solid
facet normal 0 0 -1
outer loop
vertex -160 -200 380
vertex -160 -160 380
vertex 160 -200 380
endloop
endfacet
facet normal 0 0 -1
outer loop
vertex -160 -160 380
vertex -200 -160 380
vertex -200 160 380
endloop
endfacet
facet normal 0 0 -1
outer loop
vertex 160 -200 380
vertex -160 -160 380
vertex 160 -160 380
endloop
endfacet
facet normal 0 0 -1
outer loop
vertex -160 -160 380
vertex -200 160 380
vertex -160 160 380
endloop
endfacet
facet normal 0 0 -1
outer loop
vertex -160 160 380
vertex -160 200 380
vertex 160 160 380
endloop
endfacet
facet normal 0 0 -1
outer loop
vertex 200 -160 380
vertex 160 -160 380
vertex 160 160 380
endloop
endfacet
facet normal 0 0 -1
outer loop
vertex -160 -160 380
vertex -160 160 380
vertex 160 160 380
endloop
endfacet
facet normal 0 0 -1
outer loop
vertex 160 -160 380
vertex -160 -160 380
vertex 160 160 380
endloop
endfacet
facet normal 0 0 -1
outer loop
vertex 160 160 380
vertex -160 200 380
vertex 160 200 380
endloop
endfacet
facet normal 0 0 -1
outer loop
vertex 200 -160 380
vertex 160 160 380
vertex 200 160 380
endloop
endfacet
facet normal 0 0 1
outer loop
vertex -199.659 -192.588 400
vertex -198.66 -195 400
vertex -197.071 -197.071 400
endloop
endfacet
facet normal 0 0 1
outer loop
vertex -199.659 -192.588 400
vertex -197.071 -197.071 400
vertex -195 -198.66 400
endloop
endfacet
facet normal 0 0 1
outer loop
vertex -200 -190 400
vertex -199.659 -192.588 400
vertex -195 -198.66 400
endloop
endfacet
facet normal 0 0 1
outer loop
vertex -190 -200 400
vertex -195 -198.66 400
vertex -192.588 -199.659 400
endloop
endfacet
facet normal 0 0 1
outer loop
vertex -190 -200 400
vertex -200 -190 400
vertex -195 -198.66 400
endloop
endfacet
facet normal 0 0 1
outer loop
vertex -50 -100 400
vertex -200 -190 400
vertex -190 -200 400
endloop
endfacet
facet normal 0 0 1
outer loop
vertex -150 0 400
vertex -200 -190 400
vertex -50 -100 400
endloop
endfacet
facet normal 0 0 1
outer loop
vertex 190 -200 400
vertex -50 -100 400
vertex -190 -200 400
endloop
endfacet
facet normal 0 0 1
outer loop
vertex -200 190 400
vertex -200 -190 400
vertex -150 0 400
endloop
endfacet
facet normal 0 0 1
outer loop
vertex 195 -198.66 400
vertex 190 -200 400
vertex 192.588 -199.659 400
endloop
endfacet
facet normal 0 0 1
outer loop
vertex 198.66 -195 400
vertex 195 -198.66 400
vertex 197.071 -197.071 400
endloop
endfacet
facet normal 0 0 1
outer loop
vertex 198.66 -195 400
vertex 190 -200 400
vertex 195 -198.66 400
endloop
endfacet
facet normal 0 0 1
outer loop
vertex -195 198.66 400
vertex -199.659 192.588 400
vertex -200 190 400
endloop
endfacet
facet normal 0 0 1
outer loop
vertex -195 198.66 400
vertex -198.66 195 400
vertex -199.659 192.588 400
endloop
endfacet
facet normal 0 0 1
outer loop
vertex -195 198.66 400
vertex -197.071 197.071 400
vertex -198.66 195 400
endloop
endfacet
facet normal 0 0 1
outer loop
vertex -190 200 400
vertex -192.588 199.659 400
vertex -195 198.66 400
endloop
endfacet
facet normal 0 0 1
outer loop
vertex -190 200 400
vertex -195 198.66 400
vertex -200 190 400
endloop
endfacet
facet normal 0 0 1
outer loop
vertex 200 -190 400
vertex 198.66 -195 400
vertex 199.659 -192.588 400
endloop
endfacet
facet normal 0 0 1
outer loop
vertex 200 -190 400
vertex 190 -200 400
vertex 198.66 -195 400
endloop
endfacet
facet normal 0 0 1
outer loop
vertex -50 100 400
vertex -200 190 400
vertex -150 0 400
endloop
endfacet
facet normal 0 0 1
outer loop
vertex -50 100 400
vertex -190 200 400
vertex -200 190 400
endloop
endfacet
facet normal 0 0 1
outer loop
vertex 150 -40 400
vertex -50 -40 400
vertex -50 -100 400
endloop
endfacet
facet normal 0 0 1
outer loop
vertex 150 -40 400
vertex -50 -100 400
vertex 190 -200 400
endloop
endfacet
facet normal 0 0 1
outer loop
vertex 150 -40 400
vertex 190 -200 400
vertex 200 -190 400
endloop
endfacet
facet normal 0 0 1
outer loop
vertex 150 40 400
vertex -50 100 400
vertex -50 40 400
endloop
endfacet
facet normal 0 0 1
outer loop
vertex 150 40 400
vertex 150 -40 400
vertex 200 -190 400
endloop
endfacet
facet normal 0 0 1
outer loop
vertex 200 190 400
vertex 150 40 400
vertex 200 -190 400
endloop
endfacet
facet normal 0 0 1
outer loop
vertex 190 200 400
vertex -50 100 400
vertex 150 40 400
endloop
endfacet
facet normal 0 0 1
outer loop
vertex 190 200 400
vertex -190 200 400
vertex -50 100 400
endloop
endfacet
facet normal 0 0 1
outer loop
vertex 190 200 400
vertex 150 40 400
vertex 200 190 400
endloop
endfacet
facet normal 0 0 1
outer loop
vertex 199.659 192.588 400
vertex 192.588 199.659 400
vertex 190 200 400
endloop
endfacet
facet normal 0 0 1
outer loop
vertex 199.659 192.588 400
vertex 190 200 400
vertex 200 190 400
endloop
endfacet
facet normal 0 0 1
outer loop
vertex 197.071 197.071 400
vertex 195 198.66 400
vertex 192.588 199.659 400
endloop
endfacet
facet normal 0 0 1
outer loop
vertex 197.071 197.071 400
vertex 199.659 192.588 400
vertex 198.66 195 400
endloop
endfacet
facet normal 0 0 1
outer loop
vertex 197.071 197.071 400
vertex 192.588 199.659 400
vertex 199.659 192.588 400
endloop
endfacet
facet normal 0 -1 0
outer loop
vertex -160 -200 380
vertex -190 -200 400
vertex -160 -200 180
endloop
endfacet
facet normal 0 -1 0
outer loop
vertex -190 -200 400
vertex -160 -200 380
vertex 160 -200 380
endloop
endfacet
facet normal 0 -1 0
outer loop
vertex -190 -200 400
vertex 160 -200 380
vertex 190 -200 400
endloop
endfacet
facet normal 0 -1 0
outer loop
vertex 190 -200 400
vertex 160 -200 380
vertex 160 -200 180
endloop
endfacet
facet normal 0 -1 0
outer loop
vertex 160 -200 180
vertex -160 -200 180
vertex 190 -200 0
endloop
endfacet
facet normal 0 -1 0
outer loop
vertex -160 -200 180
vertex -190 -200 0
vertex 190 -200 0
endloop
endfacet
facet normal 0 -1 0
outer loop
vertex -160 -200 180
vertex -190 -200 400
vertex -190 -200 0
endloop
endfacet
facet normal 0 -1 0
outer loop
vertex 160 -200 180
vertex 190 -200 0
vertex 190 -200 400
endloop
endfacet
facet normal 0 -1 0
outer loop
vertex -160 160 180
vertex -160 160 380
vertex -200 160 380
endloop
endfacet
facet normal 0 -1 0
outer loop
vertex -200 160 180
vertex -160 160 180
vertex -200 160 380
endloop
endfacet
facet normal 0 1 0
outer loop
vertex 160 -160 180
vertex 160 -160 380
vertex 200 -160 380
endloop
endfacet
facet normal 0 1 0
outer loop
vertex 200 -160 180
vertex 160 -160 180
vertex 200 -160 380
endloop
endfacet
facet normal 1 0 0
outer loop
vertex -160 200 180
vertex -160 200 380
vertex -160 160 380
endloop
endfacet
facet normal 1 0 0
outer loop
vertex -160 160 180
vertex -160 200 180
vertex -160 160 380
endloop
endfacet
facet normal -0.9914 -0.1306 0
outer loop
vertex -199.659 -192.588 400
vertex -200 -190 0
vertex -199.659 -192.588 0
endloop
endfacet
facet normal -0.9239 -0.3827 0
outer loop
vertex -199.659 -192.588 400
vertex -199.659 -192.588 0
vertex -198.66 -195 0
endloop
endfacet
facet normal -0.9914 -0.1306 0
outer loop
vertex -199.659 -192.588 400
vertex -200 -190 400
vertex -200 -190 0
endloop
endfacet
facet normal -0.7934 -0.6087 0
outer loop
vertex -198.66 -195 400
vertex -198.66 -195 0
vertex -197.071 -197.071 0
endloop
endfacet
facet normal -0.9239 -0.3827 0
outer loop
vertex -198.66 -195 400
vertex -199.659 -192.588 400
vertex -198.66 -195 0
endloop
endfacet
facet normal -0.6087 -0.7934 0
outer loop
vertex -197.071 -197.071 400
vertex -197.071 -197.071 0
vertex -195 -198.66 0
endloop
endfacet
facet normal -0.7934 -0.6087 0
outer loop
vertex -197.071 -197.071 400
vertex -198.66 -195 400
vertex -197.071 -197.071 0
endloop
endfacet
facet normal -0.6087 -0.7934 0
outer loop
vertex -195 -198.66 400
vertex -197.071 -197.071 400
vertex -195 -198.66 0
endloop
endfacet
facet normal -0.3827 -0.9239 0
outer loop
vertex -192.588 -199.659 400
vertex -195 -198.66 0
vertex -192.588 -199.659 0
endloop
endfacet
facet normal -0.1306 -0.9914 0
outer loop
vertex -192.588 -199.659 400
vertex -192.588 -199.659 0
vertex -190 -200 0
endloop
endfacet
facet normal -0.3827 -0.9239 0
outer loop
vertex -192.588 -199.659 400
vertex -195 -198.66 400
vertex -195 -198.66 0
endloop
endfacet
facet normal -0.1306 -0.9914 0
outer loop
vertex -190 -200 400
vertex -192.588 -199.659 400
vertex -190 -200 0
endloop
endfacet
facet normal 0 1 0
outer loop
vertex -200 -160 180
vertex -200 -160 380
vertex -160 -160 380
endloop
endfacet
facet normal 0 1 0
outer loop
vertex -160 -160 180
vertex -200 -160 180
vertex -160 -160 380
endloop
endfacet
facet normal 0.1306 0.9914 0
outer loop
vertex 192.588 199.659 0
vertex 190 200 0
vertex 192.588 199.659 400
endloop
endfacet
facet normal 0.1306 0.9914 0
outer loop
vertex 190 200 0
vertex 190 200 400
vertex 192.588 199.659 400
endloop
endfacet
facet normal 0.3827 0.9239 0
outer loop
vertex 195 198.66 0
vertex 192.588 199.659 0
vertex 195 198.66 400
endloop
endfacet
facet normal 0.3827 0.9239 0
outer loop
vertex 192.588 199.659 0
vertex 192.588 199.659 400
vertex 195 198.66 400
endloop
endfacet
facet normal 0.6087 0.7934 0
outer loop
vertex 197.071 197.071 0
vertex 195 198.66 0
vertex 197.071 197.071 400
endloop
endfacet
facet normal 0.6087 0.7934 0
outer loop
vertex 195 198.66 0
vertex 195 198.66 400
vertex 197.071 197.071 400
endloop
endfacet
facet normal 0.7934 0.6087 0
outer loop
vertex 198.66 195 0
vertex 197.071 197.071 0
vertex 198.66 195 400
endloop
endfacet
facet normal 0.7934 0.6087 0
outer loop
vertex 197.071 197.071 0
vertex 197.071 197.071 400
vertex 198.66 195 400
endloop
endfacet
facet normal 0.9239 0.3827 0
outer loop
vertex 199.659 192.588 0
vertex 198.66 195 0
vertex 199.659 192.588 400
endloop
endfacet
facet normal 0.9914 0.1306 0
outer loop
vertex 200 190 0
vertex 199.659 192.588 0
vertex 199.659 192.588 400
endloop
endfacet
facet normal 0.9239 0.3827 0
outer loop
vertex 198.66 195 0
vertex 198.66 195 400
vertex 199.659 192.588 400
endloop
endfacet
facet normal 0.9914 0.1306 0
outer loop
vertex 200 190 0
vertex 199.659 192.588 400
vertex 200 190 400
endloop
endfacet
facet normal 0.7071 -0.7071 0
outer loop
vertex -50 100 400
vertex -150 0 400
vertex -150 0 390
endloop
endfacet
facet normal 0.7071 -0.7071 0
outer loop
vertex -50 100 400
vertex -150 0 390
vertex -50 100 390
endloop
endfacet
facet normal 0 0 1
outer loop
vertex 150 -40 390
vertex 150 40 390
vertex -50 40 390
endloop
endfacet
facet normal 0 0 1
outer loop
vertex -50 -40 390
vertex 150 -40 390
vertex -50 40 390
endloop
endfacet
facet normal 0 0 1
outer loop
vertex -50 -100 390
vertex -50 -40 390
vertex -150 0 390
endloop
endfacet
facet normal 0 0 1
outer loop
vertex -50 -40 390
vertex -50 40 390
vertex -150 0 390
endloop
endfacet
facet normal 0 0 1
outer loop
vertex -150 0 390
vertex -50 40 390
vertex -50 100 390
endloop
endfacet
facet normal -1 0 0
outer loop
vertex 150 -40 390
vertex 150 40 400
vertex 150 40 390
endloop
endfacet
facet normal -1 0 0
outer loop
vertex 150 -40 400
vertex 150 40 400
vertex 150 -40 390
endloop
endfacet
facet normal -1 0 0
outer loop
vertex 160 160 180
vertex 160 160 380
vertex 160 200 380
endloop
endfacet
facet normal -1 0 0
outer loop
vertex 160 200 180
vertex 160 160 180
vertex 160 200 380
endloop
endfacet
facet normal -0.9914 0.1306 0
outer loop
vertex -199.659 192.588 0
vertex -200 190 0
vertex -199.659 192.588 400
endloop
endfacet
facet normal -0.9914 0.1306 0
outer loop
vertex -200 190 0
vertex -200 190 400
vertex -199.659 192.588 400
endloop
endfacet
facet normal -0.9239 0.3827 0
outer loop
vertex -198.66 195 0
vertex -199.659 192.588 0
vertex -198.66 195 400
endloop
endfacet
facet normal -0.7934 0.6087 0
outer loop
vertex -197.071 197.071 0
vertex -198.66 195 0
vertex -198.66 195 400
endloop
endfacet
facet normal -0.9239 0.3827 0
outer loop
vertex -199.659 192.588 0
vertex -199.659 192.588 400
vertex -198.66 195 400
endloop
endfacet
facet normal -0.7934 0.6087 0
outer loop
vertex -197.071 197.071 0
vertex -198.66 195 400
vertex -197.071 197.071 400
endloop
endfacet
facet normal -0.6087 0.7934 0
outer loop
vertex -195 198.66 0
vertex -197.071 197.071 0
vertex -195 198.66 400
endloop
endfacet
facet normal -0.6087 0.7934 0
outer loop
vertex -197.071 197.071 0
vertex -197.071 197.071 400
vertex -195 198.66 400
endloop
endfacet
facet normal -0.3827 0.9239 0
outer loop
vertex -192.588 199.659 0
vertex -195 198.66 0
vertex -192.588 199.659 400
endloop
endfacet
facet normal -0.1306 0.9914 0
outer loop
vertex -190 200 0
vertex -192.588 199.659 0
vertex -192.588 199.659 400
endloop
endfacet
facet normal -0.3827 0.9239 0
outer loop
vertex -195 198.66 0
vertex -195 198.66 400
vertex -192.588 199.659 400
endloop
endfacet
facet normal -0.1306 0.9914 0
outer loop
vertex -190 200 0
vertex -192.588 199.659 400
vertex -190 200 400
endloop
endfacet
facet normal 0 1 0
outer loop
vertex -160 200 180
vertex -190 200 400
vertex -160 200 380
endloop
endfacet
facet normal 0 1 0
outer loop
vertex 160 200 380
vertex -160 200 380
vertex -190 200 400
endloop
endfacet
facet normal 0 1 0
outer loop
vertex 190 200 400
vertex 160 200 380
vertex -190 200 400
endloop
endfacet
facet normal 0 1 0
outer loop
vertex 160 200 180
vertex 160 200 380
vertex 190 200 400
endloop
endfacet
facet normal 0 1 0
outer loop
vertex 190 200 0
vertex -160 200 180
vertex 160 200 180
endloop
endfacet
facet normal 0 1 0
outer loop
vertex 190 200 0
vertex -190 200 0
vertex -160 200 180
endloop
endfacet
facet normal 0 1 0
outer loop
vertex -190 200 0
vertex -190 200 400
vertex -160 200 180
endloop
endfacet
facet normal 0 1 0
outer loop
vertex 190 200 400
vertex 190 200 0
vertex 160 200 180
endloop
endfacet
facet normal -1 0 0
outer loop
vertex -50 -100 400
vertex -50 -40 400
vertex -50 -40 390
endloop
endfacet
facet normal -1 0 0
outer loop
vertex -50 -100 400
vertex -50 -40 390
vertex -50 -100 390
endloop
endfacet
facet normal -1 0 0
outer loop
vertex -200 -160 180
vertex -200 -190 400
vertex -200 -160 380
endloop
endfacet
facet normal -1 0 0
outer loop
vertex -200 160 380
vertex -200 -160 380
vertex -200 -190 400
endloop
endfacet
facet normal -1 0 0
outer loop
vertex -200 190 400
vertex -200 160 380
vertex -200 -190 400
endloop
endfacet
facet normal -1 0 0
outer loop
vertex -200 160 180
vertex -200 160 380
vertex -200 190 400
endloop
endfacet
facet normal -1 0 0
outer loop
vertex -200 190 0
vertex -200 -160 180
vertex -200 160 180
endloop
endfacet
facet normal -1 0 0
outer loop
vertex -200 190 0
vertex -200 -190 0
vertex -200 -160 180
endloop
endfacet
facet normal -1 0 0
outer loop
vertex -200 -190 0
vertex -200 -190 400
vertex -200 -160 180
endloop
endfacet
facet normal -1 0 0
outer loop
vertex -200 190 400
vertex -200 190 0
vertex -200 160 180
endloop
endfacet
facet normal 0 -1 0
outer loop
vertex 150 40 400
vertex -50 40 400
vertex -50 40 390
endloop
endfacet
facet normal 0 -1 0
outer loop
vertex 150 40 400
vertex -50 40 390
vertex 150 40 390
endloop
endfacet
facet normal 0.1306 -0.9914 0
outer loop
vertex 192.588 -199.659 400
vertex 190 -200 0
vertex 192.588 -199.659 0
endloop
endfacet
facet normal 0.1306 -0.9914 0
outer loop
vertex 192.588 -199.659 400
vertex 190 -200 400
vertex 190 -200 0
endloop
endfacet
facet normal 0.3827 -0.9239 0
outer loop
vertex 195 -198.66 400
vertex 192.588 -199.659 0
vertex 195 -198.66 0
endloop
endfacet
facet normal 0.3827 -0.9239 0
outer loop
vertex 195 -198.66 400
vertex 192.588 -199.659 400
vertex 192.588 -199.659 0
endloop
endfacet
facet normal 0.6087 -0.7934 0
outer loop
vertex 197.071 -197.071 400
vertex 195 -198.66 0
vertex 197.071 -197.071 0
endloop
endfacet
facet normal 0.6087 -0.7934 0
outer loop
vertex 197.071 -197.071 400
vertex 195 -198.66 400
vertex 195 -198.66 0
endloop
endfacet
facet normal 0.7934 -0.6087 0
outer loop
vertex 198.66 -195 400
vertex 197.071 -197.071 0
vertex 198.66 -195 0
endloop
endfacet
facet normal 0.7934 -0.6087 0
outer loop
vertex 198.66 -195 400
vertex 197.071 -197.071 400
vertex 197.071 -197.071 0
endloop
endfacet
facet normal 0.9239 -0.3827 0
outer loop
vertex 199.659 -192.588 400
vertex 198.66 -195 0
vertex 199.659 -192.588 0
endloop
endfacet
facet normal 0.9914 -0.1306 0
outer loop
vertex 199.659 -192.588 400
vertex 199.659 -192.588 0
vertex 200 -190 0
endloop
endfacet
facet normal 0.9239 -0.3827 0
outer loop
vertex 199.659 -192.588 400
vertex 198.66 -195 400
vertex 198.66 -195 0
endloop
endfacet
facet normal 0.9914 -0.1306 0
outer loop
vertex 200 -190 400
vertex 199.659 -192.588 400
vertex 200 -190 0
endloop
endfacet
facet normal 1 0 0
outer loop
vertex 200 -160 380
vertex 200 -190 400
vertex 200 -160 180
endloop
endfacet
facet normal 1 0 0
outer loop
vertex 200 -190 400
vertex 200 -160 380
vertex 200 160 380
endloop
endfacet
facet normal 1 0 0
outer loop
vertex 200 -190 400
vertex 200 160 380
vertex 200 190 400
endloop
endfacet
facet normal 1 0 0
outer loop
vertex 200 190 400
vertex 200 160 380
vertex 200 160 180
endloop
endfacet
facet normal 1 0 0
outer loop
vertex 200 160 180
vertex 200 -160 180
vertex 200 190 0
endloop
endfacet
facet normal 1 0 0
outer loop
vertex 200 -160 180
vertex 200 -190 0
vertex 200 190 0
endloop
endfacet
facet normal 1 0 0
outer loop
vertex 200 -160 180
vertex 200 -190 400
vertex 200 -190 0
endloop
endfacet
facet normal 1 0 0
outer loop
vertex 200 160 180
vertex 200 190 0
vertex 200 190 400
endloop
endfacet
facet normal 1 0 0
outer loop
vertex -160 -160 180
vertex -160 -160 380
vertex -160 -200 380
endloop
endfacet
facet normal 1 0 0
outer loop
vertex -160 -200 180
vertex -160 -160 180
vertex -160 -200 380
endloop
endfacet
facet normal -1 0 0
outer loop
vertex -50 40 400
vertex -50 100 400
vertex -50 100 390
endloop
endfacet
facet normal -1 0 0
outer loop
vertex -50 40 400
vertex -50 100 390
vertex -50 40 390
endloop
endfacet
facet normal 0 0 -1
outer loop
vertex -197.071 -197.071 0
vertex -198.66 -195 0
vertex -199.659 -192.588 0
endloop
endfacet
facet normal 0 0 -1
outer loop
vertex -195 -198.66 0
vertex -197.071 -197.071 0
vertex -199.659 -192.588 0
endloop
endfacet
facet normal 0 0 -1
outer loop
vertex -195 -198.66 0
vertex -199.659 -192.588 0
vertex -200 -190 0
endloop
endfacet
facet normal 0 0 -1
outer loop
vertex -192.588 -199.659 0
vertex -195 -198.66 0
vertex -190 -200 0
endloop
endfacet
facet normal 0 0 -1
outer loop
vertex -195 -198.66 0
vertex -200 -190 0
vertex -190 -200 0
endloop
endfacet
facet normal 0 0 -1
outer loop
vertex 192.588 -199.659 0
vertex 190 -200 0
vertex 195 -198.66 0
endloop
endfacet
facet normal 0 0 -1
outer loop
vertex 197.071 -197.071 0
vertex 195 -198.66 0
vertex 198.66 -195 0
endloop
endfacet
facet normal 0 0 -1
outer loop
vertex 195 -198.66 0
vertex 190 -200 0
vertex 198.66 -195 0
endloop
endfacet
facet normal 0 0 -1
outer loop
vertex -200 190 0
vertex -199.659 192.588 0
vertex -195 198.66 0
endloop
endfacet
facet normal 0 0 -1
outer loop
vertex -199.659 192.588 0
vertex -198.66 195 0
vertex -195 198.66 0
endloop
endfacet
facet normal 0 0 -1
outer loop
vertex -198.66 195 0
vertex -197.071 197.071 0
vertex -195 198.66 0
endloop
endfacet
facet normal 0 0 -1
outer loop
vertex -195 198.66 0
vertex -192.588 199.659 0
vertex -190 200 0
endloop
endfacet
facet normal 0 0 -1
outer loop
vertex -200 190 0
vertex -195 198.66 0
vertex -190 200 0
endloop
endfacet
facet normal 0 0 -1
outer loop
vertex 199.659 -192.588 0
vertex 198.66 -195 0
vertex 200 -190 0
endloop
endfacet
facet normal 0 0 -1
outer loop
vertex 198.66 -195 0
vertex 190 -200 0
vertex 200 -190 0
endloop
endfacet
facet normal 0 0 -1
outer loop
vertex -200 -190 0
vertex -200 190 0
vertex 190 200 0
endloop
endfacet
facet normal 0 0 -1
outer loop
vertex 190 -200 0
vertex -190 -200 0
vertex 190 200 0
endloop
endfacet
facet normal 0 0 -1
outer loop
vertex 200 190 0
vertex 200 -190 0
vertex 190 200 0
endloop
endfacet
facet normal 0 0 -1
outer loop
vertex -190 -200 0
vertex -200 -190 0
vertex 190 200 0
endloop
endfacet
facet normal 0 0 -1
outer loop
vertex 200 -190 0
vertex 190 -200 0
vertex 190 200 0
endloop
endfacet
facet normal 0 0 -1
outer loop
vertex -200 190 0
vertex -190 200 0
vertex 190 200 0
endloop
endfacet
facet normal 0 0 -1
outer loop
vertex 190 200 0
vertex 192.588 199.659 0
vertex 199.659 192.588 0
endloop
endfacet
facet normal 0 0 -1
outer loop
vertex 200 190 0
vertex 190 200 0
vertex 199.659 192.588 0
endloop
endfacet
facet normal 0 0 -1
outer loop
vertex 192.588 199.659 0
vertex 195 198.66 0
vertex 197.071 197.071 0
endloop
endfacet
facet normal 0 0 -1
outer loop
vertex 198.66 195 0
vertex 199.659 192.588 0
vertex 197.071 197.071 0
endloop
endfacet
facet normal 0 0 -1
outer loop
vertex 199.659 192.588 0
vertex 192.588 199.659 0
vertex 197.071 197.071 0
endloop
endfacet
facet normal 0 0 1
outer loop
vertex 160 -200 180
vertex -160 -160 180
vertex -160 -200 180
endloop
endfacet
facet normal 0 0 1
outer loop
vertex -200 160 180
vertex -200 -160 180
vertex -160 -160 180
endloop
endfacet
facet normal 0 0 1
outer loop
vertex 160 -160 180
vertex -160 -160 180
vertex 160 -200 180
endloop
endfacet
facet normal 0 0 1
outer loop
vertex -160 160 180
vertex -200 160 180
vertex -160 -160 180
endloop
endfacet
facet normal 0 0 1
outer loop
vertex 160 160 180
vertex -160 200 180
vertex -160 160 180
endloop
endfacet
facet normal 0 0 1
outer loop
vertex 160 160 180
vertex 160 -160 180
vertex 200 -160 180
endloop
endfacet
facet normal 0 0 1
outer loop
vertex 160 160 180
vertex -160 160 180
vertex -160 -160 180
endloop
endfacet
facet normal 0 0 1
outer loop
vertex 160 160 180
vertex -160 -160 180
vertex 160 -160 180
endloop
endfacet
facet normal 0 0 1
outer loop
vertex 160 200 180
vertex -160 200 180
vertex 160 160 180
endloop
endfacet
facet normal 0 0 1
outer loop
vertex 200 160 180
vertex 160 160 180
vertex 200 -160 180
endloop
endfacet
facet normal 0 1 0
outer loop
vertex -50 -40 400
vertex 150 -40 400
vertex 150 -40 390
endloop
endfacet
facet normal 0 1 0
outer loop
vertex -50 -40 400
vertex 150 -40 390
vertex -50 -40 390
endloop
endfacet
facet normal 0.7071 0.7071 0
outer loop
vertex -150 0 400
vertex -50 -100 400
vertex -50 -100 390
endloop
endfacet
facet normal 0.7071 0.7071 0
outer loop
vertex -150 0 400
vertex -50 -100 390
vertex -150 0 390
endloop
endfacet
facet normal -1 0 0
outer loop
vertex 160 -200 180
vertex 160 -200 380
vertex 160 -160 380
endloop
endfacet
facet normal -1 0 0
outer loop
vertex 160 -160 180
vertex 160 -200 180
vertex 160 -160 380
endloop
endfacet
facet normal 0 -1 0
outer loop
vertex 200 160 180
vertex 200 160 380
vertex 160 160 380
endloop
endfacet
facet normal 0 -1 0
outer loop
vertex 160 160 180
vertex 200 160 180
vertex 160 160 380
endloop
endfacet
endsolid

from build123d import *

# Parameters (mm, degrees)
SKETCH1_W           = 400
SKETCH1_H           = 400
BOSS_EXTRUDE1_DEPTH = 400
CUT_EXTRUDE1_DEPTH  = 200
CUT_EXTRUDE2_DEPTH  = 10
FILLET1_R           = 10


with BuildPart() as part:
    # Sketch1 → Boss-Extrude1 (new body)
    with BuildSketch(Plane.XY):
        Rectangle(SKETCH1_W, SKETCH1_H)
    extrude(amount=BOSS_EXTRUDE1_DEPTH)

    # Sketch2 → Cut-Extrude1 (cut)
    with BuildSketch(Plane.XY.offset(380)):
        Polygon((160, 200), (-160, 200), (-160, 160), (-200, 160), (-200, -160), (-160, -160), (-160, -200), (160, -200), (160, -160), (200, -160), (200, 160), (160, 160), align=None)
    extrude(amount=-CUT_EXTRUDE1_DEPTH, mode=Mode.SUBTRACT)

    # Sketch3 → Cut-Extrude2 (cut)
    with BuildSketch(Plane.XY.offset(400)):
        Polygon((-150, 0), (-50, 100), (-50, 40), (150, 40), (150, -40), (-50, -40), (-50, -100), align=None)
    extrude(amount=-CUT_EXTRUDE2_DEPTH, mode=Mode.SUBTRACT)

    # Fillet1
    fillet1_edges = [part.edges().sort_by_distance(p)[0] for p in [
        (200, -200, 200),
        (-200, -200, 200),
        (-200, 200, 200),
        (200, 200, 200),
    ]]
    fillet(fillet1_edges, radius=FILLET1_R)


solid = part.part
